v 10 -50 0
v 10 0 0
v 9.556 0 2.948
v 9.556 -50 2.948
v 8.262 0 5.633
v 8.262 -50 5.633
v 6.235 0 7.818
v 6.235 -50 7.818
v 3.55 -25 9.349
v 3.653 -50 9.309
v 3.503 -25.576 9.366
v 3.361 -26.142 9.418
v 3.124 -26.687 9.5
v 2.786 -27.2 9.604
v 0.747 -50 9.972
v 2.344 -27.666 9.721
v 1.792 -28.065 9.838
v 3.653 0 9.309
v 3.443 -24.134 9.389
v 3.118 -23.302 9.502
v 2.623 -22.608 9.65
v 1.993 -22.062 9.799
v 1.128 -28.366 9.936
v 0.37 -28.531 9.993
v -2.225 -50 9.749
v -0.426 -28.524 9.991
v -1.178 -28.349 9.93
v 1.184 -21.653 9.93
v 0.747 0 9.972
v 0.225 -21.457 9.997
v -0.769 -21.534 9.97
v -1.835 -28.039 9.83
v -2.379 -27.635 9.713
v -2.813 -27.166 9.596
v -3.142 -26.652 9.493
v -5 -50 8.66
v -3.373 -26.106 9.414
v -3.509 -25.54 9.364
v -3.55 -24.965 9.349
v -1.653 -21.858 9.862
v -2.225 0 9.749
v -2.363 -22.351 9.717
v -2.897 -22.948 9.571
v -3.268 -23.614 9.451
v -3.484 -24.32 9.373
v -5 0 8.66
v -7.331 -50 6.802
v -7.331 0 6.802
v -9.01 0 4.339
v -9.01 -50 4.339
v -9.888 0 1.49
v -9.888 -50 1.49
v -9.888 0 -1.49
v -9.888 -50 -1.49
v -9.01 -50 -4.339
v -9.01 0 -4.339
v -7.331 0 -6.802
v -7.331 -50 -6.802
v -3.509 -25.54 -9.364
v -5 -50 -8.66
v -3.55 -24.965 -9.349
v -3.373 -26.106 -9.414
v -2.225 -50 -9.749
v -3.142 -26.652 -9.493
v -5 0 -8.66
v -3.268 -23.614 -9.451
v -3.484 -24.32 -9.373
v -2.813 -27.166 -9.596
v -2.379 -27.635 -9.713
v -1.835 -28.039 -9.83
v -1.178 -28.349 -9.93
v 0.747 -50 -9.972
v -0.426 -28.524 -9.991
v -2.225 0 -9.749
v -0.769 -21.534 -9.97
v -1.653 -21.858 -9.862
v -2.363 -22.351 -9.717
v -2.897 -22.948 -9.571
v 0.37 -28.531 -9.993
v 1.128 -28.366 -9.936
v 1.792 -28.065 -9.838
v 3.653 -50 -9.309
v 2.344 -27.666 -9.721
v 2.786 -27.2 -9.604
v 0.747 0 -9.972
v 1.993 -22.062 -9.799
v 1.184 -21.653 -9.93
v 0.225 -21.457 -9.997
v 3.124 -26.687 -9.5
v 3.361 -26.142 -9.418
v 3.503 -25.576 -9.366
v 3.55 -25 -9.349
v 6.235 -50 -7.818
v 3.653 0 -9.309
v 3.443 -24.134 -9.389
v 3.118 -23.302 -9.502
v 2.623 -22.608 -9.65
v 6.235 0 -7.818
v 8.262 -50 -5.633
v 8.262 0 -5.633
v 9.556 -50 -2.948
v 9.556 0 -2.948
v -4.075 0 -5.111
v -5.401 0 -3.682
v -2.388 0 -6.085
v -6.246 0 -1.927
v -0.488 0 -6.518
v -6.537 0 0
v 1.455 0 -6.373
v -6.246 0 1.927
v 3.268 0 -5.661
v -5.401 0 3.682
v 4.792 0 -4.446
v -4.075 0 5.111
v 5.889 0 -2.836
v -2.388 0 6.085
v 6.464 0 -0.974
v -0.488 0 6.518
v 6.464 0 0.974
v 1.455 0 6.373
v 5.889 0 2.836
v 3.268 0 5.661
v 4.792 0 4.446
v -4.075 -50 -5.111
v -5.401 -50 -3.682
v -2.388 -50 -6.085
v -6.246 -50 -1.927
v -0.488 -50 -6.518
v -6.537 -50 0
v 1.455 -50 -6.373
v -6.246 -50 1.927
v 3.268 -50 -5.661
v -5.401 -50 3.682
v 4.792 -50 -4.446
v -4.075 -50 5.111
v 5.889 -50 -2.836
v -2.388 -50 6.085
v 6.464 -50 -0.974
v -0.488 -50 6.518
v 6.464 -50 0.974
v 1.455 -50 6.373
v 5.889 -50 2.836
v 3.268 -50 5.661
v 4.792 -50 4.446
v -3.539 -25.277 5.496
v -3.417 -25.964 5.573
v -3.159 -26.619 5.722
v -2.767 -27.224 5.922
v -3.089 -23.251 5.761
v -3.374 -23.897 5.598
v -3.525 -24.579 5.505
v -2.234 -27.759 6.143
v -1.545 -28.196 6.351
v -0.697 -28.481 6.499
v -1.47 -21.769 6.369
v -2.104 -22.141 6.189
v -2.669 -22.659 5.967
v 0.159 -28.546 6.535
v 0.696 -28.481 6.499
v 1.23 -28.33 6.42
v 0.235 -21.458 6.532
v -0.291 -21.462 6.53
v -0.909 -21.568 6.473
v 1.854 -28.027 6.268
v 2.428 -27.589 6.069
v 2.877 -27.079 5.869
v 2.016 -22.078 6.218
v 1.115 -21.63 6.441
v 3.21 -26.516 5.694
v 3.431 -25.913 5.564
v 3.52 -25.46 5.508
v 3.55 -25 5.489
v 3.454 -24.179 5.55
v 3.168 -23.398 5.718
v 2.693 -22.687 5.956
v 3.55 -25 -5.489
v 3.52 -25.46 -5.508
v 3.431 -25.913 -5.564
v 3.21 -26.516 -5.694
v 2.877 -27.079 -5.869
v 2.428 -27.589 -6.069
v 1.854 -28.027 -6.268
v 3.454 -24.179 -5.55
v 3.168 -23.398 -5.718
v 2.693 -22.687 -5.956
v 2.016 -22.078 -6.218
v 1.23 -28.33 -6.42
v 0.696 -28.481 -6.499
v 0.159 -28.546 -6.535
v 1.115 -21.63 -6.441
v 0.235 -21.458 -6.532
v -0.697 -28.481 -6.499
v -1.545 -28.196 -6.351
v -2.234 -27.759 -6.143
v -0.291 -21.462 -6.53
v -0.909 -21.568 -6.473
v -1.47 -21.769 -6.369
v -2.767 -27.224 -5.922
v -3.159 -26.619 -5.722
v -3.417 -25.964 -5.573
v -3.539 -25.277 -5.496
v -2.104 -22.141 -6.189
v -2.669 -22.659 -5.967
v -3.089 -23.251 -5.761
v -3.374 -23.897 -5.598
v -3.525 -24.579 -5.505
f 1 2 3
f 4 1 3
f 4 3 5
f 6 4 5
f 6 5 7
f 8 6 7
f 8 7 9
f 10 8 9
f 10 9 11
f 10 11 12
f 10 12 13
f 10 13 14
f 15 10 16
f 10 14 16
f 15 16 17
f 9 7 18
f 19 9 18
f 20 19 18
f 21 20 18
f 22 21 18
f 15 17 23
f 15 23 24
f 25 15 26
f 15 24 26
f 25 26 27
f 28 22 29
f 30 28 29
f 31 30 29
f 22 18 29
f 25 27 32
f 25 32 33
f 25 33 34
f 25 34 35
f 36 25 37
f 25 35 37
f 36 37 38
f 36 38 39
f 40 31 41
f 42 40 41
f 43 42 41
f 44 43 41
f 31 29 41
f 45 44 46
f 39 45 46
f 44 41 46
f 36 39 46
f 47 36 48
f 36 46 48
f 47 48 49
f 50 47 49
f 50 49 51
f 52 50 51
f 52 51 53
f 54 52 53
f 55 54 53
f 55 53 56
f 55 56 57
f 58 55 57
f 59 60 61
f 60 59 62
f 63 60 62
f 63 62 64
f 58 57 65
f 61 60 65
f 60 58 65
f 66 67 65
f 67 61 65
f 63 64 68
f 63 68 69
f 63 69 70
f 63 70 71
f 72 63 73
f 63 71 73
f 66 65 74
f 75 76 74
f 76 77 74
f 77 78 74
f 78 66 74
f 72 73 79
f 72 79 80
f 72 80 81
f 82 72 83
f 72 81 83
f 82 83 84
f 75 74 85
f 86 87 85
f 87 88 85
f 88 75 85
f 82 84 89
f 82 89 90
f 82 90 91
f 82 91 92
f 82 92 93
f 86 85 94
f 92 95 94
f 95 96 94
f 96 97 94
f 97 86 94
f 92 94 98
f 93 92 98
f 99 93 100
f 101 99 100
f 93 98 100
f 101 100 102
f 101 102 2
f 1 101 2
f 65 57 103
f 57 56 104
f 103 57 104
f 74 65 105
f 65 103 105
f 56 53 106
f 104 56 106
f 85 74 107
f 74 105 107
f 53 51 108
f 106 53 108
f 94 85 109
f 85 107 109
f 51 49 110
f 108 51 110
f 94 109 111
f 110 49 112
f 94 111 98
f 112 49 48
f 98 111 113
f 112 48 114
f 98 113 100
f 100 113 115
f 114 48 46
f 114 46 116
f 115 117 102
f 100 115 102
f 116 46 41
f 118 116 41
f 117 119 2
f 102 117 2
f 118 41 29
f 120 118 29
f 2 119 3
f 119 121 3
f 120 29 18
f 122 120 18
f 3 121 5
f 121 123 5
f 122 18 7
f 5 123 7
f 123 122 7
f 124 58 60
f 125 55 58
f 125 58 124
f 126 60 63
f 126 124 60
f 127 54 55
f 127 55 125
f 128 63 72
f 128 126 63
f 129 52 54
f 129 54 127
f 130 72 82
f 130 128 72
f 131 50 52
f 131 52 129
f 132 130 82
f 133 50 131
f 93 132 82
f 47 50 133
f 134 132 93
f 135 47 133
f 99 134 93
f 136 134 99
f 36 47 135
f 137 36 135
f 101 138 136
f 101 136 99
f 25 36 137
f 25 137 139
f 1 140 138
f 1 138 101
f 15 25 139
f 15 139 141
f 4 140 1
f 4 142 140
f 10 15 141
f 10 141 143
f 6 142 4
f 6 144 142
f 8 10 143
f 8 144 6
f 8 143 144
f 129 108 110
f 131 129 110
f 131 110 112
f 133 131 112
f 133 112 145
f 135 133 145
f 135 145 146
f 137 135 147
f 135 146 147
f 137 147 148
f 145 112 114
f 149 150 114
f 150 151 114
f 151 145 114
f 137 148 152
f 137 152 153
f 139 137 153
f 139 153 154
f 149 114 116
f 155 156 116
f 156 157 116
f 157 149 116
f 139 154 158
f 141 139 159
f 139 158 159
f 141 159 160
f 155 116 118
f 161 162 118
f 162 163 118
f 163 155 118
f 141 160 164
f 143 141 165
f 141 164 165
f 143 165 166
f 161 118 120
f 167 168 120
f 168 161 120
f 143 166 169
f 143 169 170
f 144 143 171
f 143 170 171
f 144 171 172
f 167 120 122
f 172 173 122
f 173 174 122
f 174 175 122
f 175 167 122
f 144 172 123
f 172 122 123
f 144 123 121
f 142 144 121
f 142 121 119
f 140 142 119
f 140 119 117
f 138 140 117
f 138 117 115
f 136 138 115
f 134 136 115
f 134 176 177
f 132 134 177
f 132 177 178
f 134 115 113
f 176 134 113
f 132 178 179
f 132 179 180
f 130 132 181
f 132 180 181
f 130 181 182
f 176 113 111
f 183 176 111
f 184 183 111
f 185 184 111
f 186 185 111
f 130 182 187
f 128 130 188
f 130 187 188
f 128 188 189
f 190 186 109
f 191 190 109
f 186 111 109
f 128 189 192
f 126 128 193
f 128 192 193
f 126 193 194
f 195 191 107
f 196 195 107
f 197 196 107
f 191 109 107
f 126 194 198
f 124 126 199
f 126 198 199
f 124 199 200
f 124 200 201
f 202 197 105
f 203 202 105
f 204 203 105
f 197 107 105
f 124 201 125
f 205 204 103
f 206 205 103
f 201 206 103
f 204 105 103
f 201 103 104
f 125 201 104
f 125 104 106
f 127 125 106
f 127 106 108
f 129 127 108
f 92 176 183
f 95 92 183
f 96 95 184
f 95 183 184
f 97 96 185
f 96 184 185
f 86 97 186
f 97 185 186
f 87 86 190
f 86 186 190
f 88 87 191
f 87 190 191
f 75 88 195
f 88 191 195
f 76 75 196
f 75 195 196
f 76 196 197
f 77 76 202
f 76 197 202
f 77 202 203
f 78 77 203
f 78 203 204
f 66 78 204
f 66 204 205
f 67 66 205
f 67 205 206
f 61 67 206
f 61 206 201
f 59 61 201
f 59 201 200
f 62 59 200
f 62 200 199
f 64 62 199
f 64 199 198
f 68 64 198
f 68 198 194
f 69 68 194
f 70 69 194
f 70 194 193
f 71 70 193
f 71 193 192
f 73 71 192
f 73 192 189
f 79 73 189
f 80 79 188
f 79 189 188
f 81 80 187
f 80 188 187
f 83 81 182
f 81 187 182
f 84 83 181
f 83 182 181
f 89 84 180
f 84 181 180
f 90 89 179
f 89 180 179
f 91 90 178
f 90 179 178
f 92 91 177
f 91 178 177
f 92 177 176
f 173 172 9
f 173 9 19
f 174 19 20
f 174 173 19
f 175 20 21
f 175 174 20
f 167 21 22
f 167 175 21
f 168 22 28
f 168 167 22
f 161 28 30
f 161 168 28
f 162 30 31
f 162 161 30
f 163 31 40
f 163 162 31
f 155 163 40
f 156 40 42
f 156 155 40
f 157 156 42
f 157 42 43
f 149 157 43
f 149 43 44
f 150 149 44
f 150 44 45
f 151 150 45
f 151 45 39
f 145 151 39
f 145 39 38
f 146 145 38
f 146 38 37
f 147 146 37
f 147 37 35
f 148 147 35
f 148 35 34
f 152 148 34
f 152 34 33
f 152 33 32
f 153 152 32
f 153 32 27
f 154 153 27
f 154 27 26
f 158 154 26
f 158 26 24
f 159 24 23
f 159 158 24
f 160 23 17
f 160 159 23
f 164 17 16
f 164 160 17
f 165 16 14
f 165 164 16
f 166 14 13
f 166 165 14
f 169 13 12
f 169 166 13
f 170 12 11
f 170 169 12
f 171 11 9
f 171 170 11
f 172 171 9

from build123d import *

# Parameters (mm, degrees)
F0_R          = 10
F1_DEPTH      = 50
F2_R          = 3.55
F3_DEPTH      = 25
F3_DEPTH_BACK = 25
F4_R          = 6.5365859356
F5_DEPTH      = 60


with BuildPart() as f1:
    # F0 (on Front) → F1 (new body)
    with BuildSketch(Plane.XZ):
        Circle(F0_R)
    extrude(amount=F1_DEPTH)

    # F2 (on Top) → F3 (cut, two sides)
    with BuildSketch(Plane.XY) as f3_sk:
        with Locations((0, -25)):
            Circle(F2_R)
    extrude(amount=-F3_DEPTH, mode=Mode.SUBTRACT)
    extrude(f3_sk.sketch, amount=F3_DEPTH_BACK, mode=Mode.SUBTRACT)

    # F4 (on face) → F5 (cut)
    with BuildSketch(Plane(origin=(0, 0, 0), x_dir=(-1, 0, 0), z_dir=(0, 1, 0))):
        Circle(F4_R)
    extrude(amount=-F5_DEPTH, mode=Mode.SUBTRACT)


solid = f1.part
